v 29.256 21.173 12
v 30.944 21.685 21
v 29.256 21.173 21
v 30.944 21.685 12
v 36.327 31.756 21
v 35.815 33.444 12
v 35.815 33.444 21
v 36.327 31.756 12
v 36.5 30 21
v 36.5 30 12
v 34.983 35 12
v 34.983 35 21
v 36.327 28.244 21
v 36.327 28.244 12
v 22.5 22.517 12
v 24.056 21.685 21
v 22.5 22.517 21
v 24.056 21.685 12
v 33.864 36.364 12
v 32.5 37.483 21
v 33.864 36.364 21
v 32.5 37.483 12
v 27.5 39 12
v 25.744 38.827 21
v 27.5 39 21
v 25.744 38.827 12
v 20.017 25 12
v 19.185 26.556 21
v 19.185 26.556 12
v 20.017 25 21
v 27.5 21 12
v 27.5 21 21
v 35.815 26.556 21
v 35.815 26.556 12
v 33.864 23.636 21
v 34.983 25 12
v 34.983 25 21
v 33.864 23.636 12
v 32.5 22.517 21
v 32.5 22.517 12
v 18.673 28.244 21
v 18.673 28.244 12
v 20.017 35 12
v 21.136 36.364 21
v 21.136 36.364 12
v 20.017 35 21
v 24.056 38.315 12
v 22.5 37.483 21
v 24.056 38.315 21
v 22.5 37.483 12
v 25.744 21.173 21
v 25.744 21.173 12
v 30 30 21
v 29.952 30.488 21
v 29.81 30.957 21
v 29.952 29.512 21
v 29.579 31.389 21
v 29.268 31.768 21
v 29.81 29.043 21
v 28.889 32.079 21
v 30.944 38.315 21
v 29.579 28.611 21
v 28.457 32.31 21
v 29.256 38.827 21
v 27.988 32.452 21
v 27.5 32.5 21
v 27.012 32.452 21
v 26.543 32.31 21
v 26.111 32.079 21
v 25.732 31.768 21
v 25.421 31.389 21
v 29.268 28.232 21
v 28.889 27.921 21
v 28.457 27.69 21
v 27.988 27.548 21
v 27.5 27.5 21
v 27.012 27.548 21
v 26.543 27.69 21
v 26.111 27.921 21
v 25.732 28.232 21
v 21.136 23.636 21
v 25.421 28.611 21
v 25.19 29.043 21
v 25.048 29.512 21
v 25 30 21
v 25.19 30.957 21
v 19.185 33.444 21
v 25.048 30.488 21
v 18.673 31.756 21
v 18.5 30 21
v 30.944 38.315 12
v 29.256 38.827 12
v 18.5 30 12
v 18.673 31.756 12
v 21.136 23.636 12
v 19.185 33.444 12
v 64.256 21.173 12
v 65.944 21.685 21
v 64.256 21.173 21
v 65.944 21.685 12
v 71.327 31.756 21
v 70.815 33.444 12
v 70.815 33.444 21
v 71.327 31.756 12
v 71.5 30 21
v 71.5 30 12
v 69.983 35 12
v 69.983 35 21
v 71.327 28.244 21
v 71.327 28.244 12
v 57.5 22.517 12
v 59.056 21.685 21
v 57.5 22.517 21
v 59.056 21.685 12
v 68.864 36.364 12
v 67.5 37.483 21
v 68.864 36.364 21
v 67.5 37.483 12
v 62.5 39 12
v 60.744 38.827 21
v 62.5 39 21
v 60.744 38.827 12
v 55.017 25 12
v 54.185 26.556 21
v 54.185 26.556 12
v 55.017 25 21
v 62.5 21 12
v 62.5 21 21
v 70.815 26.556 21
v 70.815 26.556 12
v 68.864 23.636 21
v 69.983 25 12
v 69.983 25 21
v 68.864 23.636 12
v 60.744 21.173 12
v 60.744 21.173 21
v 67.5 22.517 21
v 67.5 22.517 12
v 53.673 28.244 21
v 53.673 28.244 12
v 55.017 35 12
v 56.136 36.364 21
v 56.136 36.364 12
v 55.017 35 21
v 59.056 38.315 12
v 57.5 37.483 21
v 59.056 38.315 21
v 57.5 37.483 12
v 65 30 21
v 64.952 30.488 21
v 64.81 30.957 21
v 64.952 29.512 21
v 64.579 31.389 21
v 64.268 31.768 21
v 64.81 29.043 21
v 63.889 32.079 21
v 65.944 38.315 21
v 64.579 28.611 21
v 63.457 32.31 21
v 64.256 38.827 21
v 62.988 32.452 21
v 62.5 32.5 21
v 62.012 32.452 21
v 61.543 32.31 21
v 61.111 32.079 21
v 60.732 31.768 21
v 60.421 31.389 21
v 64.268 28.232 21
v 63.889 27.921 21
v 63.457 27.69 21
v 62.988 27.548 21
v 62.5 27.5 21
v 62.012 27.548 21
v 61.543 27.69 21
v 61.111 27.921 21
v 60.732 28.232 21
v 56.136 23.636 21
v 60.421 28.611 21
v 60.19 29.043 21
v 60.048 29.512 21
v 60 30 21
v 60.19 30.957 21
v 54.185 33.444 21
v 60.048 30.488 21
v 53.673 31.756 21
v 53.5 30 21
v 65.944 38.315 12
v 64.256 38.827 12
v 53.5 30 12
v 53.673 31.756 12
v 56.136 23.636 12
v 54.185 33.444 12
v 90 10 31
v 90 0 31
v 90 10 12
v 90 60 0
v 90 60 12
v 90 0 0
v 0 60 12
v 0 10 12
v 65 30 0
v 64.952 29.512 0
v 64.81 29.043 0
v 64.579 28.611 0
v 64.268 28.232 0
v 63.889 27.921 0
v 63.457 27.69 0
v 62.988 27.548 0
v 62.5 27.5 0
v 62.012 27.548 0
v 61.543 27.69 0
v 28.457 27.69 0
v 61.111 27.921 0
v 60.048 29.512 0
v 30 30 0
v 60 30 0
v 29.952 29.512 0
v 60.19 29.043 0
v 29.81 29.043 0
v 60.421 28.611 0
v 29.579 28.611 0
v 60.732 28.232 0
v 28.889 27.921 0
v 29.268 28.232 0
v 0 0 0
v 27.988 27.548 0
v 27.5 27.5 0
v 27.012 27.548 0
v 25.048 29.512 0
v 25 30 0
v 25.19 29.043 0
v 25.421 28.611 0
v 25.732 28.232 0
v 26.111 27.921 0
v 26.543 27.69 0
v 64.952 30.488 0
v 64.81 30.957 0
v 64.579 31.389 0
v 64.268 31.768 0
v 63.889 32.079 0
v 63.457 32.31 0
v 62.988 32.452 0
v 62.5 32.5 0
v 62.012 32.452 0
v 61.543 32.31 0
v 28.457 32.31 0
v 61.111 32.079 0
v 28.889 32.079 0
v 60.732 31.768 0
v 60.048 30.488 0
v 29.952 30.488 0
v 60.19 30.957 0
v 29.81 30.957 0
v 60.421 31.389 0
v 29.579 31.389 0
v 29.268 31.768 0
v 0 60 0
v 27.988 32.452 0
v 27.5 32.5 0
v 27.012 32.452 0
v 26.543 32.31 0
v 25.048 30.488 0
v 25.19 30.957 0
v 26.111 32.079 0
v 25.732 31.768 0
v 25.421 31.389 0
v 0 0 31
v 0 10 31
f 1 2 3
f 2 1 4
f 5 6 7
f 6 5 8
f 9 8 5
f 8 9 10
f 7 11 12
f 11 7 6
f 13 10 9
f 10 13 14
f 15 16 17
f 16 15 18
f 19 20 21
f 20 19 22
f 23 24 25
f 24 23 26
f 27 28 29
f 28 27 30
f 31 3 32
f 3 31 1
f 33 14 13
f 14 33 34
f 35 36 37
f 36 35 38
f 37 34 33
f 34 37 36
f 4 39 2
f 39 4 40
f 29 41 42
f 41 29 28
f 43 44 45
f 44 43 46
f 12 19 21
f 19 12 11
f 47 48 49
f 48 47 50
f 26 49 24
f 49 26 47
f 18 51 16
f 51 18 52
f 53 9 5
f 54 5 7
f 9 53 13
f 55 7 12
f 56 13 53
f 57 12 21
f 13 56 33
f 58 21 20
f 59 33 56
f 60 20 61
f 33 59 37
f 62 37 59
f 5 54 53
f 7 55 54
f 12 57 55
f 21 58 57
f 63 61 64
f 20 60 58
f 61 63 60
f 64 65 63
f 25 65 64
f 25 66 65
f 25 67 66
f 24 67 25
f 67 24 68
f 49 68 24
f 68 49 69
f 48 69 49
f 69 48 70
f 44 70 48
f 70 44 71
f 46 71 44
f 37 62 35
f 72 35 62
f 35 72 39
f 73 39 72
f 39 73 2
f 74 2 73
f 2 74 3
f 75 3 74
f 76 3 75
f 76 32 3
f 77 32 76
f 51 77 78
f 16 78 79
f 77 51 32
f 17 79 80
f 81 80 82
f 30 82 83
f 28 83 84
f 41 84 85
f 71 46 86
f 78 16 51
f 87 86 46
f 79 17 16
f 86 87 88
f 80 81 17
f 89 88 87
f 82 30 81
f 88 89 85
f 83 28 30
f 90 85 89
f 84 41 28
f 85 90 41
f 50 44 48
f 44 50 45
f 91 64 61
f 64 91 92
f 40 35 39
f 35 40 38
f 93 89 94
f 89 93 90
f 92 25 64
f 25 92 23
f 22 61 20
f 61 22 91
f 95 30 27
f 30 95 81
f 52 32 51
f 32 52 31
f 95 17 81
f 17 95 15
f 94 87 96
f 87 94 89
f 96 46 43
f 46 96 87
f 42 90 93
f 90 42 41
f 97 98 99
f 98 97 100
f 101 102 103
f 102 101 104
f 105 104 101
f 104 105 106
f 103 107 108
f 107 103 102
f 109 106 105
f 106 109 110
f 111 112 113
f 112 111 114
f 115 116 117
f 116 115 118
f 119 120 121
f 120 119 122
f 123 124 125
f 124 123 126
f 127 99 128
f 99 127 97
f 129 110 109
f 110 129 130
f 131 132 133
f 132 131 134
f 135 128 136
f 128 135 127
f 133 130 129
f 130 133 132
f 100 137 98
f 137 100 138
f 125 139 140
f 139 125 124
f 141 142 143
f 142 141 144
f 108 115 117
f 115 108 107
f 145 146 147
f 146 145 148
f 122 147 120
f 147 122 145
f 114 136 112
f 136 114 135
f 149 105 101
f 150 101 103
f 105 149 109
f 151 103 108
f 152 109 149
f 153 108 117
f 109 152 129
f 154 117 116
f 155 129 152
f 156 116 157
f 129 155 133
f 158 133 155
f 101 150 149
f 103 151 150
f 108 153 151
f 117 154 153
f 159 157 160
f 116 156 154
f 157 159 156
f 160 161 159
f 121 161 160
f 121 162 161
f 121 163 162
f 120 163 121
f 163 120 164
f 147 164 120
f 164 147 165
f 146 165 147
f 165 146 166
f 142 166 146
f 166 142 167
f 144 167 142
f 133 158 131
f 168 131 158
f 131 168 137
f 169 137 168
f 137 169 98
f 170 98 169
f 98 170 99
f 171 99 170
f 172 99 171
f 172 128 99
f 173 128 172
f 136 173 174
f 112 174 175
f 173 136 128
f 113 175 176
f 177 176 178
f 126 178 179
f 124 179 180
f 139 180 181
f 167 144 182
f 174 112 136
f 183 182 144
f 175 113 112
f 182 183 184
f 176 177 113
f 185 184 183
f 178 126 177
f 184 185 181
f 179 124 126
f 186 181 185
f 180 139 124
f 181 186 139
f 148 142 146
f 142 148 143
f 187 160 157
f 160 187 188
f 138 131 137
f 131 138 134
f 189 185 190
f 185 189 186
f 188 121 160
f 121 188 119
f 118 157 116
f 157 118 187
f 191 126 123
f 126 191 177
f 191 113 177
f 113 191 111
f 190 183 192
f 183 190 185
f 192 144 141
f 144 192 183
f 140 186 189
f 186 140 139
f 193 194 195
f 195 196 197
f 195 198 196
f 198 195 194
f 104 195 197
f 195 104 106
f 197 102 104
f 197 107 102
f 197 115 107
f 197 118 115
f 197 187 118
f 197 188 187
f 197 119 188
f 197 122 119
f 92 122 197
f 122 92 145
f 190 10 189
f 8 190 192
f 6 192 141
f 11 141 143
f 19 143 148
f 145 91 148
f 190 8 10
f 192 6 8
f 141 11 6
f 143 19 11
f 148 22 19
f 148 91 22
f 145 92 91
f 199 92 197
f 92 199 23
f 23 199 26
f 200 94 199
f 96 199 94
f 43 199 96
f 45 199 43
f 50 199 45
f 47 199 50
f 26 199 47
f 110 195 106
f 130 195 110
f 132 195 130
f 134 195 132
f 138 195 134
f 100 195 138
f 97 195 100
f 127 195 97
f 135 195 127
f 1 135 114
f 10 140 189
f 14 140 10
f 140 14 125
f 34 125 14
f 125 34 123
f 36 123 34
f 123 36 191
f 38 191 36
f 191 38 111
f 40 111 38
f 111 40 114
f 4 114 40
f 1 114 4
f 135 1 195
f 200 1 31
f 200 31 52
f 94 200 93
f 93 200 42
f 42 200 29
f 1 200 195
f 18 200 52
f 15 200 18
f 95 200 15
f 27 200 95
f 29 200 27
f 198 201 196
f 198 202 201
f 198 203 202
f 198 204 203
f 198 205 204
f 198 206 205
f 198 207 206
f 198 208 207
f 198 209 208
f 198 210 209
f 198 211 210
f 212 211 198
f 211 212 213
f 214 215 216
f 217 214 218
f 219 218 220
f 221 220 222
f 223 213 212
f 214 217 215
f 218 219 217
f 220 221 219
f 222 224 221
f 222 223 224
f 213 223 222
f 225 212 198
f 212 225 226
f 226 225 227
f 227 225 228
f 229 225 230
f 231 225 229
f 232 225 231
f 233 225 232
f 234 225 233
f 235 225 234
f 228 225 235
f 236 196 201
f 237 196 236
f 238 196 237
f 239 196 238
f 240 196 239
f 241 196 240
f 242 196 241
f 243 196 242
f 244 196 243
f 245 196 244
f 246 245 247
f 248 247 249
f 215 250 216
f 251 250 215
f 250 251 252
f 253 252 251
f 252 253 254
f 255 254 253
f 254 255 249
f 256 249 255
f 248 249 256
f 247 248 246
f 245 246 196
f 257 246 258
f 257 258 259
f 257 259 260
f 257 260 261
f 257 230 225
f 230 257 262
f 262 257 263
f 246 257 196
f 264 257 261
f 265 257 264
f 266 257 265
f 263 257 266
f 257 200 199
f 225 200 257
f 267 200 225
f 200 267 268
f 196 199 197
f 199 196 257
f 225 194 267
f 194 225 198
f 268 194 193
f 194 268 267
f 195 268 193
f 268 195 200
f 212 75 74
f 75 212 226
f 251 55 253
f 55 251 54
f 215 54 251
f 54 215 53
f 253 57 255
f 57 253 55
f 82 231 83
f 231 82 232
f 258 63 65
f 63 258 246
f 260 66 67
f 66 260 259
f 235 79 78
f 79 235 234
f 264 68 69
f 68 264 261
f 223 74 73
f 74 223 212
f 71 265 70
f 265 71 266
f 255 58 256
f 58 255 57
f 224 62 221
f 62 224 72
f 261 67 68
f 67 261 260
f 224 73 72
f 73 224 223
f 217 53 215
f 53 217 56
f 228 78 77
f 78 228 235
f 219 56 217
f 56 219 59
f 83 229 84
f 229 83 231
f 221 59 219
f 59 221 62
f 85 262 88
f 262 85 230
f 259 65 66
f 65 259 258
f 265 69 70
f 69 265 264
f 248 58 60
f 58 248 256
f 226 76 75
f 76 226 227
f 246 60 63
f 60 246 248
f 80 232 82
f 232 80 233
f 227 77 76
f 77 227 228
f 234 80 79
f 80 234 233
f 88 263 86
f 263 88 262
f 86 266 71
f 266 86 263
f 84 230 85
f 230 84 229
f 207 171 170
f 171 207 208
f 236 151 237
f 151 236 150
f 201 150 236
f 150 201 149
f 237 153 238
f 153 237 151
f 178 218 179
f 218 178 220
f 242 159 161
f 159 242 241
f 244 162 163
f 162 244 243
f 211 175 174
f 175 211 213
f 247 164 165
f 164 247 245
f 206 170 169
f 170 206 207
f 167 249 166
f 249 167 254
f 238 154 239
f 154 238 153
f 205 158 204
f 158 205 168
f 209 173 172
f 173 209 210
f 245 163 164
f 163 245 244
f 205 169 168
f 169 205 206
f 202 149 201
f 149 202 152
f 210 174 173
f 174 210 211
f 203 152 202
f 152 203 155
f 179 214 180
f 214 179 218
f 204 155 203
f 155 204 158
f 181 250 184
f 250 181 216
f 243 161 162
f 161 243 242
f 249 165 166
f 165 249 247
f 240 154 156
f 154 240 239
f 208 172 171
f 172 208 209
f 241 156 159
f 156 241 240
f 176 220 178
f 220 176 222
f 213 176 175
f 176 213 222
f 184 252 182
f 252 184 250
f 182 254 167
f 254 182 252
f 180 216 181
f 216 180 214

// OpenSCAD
$fn = 32;

// ----------------------------------------------------------------------
// Drill jig: fence jig
// ----------------------------------------------------------------------

// --- parameters (mm) ---
plate_l = 90;             // plate length, X
plate_w = 60;             // plate width, Y
plate_t = 12;             // plate thickness
boss_d = 18;              // guide boss diameter
boss_h = 10;              // boss height above the plate
guide_d = 5;              // guide hole diameter
boss_pitch = 35;          // boss pitch
fence_h = 20;             // fence height above the plate
fence_t = 10;             // fence thickness

n_boss = 2;  // guide bosses
boss_x0 = (plate_l - (n_boss - 1) * boss_pitch) / 2;  // first boss X
boss_top = plate_t - 1 + boss_h;  // boss crown height
fence_top = plate_t - 1 + fence_h;  // fence crown height
total_h = max([fence_top, boss_top]);  // overall height

difference() {
  union() {
  cube([plate_l, plate_w, plate_t]);
  for (i = [0 : n_boss - 1])
    translate([boss_x0 + i * boss_pitch, plate_w / 2, plate_t - 1])
      cylinder(h = boss_h, d = boss_d);
  translate([0, 0, plate_t - 1]) cube([plate_l, fence_t, fence_h]);
  }
  for (i = [0 : n_boss - 1])
    translate([boss_x0 + i * boss_pitch, plate_w / 2, -1])
      cylinder(h = plate_t + boss_h, d = guide_d);
}
